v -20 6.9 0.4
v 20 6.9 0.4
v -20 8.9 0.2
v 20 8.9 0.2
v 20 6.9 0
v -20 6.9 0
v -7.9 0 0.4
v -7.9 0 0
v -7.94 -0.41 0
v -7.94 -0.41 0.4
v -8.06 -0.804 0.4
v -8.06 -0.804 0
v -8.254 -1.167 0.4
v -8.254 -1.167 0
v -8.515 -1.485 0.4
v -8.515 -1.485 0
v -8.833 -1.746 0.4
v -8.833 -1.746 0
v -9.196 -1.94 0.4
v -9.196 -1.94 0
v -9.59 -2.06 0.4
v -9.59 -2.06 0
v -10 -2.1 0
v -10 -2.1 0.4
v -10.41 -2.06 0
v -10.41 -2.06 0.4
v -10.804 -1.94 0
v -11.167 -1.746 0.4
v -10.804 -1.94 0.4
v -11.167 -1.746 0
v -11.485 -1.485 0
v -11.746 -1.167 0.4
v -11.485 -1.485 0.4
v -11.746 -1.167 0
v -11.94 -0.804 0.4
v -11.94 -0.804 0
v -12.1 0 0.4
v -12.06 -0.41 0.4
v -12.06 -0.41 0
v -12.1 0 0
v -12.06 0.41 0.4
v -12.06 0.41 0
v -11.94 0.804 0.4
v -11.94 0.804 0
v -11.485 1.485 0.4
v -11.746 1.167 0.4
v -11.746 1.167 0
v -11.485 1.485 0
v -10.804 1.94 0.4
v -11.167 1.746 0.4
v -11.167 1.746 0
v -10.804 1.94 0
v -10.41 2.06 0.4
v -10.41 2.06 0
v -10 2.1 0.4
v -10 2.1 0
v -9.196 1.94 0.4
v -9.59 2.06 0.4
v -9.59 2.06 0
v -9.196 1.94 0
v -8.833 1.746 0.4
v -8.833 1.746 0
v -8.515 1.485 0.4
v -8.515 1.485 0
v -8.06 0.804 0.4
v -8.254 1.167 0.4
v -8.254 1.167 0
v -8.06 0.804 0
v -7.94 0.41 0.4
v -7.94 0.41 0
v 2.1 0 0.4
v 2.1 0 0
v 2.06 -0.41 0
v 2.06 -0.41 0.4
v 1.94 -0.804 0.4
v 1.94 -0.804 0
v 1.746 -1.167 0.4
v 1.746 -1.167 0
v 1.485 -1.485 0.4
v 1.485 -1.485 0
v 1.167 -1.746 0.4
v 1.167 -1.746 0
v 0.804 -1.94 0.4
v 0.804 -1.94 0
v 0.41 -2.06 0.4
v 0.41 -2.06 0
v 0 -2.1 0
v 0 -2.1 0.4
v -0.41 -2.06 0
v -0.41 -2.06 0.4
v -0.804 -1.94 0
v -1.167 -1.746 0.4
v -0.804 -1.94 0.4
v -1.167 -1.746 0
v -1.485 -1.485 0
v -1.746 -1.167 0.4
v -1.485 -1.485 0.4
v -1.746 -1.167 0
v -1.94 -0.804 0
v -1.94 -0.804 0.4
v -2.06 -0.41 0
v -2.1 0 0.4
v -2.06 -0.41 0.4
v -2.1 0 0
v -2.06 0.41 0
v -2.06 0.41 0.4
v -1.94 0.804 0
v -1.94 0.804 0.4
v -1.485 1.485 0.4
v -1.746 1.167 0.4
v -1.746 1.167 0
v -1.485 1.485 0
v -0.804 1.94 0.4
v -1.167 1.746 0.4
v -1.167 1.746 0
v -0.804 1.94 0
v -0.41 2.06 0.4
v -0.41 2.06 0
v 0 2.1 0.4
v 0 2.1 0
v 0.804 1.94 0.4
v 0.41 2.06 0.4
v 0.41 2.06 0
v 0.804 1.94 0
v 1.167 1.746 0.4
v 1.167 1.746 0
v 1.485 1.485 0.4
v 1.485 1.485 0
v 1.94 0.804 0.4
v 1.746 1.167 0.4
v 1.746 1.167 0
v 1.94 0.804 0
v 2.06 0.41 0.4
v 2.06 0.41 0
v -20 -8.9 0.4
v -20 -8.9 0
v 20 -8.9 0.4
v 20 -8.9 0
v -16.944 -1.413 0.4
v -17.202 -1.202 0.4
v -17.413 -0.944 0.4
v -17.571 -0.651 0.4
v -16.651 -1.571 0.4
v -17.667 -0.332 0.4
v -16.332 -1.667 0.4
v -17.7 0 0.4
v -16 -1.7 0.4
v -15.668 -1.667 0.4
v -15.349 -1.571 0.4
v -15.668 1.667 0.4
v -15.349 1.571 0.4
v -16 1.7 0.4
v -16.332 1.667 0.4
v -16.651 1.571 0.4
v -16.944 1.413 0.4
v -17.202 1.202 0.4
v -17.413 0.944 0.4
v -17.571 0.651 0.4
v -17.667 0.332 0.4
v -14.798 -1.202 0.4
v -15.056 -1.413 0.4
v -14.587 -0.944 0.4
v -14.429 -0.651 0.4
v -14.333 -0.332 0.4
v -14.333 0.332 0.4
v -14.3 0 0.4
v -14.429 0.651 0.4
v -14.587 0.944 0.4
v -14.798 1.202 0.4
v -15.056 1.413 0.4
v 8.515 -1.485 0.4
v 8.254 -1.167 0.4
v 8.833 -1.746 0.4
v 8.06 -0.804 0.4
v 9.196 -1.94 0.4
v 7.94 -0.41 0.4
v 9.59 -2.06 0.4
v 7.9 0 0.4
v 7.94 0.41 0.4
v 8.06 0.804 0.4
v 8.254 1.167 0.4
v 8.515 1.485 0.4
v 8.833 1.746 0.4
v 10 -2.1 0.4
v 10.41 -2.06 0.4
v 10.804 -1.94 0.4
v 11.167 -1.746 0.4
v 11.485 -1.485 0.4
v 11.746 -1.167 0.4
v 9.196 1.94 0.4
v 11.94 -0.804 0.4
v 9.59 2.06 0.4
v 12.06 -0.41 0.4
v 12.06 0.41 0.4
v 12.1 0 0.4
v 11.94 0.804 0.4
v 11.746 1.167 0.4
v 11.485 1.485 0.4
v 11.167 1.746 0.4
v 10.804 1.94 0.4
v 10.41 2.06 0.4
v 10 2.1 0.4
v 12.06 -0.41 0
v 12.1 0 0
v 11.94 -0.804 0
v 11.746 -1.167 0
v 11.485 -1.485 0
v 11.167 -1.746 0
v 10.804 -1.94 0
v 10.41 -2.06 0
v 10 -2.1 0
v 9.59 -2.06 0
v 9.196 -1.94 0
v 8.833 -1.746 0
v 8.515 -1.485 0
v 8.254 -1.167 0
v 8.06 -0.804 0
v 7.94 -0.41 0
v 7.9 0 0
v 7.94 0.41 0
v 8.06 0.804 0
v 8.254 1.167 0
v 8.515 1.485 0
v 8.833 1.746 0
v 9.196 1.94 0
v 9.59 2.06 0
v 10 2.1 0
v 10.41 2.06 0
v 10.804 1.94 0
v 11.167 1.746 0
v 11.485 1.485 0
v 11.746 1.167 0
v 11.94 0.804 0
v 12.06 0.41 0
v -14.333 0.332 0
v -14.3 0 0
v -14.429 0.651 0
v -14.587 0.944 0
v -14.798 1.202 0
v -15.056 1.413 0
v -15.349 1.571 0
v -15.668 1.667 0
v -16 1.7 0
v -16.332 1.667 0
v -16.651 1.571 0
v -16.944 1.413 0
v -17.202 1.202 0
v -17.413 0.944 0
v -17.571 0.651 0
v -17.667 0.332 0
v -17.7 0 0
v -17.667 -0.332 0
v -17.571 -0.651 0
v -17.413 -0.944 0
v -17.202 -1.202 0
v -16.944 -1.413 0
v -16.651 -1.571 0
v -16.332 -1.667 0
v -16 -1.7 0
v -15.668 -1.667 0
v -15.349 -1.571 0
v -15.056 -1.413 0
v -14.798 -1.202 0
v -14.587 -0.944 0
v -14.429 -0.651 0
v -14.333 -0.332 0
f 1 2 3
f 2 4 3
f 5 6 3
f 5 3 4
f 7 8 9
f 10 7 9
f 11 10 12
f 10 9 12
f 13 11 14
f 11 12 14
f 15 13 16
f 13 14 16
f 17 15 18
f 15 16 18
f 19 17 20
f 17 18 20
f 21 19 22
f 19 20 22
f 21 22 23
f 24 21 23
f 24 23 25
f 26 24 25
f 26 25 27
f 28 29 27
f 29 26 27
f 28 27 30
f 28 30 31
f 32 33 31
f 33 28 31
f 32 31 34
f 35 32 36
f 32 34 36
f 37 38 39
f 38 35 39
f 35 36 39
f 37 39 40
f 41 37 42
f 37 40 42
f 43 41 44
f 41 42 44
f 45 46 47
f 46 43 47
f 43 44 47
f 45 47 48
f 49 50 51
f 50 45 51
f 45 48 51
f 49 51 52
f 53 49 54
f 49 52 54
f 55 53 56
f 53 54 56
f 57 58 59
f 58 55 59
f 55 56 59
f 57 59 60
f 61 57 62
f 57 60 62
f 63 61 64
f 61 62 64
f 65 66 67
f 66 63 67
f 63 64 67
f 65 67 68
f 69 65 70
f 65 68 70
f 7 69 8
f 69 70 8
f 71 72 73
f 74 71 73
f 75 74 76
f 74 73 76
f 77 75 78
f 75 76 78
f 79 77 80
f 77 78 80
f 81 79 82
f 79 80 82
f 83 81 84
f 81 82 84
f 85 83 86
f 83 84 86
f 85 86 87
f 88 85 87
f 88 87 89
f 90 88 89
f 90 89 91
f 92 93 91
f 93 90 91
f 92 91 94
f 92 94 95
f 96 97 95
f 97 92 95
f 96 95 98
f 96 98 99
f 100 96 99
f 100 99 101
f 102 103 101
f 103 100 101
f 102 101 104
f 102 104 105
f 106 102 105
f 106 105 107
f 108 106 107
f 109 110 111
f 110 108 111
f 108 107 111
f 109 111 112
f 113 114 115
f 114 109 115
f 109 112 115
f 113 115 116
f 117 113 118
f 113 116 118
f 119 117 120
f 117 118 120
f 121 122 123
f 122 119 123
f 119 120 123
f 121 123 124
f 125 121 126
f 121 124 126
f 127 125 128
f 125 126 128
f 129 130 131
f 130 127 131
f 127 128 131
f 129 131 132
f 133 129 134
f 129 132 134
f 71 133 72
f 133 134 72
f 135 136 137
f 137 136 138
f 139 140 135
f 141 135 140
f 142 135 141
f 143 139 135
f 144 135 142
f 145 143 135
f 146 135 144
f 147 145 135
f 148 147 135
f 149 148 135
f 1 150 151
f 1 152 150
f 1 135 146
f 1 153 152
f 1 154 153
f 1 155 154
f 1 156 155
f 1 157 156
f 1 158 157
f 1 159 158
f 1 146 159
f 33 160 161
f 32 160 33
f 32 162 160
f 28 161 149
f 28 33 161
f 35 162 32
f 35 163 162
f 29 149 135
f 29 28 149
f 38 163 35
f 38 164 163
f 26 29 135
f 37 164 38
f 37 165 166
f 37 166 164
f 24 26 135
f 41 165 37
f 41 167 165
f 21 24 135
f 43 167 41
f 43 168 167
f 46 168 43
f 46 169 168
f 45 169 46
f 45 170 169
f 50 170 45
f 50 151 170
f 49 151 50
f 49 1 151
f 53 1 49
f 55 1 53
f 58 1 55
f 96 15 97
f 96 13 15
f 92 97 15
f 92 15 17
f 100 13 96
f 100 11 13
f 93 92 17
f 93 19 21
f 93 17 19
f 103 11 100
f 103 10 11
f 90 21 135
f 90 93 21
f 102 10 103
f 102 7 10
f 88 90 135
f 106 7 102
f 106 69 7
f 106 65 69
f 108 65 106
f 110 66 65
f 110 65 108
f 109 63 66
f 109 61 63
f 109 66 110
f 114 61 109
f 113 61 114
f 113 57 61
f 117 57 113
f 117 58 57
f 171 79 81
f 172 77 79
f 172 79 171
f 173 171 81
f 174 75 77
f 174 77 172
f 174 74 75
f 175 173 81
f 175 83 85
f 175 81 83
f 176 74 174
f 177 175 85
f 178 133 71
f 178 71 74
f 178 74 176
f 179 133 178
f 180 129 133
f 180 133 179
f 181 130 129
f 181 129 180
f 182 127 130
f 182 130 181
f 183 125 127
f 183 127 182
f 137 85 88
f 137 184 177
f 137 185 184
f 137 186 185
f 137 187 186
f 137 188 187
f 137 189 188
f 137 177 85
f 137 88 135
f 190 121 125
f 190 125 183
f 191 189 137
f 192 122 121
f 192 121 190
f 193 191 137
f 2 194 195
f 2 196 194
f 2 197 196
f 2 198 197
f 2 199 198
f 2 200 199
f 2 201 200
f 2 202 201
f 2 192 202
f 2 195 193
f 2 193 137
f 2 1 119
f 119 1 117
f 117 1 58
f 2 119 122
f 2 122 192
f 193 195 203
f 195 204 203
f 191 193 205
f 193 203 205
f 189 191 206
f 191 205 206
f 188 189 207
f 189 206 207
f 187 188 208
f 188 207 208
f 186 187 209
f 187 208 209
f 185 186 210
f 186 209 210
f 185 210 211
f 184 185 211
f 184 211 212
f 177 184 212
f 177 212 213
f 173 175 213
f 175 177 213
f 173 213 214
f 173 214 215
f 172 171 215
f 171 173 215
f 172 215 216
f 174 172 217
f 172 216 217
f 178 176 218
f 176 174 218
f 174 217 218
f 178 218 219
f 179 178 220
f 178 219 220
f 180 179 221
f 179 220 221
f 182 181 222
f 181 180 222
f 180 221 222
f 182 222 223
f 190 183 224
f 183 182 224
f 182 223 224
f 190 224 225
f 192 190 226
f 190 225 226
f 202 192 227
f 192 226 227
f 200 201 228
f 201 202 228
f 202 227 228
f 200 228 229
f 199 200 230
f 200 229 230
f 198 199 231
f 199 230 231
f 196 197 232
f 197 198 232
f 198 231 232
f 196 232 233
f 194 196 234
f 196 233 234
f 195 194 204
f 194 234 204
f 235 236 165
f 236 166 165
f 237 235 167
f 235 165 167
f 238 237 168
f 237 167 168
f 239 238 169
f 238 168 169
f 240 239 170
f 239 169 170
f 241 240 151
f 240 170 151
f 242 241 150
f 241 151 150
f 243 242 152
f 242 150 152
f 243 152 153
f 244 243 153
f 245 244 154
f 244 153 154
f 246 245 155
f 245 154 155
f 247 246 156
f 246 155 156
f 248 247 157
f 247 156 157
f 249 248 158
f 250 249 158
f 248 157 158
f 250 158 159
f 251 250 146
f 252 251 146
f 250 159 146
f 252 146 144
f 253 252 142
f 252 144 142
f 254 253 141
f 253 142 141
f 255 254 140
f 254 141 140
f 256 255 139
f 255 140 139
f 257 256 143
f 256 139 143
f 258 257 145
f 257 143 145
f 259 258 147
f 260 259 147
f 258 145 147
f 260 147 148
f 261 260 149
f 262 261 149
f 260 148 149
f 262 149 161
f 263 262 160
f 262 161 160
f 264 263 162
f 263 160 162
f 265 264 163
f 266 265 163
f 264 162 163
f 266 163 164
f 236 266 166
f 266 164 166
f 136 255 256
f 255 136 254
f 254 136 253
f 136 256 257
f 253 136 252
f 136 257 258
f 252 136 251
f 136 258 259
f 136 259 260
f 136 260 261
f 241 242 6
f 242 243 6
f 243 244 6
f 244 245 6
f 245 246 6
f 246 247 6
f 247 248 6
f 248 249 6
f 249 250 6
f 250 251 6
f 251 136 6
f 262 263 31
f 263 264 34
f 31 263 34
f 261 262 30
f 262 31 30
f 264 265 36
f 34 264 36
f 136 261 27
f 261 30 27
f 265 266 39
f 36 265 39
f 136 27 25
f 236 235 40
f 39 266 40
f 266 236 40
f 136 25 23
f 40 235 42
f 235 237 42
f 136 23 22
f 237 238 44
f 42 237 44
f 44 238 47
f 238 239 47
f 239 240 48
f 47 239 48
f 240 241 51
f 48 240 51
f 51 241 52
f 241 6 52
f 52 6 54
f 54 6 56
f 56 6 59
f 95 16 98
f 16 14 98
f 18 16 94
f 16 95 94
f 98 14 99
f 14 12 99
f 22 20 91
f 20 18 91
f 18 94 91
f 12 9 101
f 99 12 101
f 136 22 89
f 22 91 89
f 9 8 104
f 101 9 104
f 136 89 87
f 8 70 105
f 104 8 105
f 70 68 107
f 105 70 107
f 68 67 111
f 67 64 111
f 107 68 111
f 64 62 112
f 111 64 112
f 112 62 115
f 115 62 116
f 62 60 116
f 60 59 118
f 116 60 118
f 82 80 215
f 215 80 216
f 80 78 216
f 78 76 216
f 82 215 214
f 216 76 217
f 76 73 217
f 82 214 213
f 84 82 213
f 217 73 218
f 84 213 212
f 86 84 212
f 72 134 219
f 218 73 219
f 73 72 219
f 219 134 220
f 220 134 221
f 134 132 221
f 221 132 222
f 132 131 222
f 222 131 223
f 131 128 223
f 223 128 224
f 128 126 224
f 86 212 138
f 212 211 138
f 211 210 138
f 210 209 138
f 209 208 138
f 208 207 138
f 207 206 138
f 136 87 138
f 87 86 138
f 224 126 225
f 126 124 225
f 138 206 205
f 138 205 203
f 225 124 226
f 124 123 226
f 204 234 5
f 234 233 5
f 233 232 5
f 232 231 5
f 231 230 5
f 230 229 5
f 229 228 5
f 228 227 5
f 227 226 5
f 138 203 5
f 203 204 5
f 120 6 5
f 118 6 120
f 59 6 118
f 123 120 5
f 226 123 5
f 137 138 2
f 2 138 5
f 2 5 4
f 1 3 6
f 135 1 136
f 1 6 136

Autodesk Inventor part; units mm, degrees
ref_plane "YZ Plane" through (0, 0, 0) normal (1, 0, 0) x (0, 1, 0)
ref_plane "XZ Plane" through (0, 0, 0) normal (0, 1, 0) x (-1, 0, 0)
ref_plane "XY Plane" through (0, 0, 0) normal (0, 0, 1) x (1, 0, 0)
sketch "スケッチ1" plane through (0, 0, 0) normal (0, 0, 1) x (1, 0, 0)
  line L0 (-20, -8.9) -> (20, -8.9)
  line L1 (20, -8.9) -> (20, 8.9)
  line L2 (20, 8.9) -> (-20, 8.9)
  line L3 (-20, 8.9) -> (-20, -8.9)
  line L4 (-20, -8.9) -> (20, 8.9) construction
  line L5 (20, -8.9) -> (-20, 8.9) construction
  circle A0 centre (0, 0) radius 2.1
  circle A1 centre (10, 0) radius 2.1
  circle A2 centre (-10, 0) radius 2.1
  dimension "d0" = 40
  dimension "d1" = 17.8
  dimension "d2" = 4.2
  dimension "d3" = 4.2
  dimension "d4" = 4.2
extrude "押し出し1" add sketch "スケッチ1" along normal blind 0.4
chamfer "面取り1" distance 2 distance2 0.2 1 edges at (0, 8.9, 0.4) measured on face at (0.0844, -6.6282, 0.4)
chamfer "面取り2" distance 0.2 distance2 2 1 edges at (0, 8.9, 0) measured on face at (-6.6667, 8.9, 0.0667)
sketch "スケッチ2" plane through (0, 0, 0.4) normal (0, 0, 1) x (1, 0, 0)
  circle A0 centre (-16, 0) radius 1.7
  point P0 (0, 0)
  dimension "d13" = 3.4
extrude "押し出し2" cut sketch "スケッチ2" against normal blind 10
properties part number "cutter_XB210" material "鋼 AISI 1015"
